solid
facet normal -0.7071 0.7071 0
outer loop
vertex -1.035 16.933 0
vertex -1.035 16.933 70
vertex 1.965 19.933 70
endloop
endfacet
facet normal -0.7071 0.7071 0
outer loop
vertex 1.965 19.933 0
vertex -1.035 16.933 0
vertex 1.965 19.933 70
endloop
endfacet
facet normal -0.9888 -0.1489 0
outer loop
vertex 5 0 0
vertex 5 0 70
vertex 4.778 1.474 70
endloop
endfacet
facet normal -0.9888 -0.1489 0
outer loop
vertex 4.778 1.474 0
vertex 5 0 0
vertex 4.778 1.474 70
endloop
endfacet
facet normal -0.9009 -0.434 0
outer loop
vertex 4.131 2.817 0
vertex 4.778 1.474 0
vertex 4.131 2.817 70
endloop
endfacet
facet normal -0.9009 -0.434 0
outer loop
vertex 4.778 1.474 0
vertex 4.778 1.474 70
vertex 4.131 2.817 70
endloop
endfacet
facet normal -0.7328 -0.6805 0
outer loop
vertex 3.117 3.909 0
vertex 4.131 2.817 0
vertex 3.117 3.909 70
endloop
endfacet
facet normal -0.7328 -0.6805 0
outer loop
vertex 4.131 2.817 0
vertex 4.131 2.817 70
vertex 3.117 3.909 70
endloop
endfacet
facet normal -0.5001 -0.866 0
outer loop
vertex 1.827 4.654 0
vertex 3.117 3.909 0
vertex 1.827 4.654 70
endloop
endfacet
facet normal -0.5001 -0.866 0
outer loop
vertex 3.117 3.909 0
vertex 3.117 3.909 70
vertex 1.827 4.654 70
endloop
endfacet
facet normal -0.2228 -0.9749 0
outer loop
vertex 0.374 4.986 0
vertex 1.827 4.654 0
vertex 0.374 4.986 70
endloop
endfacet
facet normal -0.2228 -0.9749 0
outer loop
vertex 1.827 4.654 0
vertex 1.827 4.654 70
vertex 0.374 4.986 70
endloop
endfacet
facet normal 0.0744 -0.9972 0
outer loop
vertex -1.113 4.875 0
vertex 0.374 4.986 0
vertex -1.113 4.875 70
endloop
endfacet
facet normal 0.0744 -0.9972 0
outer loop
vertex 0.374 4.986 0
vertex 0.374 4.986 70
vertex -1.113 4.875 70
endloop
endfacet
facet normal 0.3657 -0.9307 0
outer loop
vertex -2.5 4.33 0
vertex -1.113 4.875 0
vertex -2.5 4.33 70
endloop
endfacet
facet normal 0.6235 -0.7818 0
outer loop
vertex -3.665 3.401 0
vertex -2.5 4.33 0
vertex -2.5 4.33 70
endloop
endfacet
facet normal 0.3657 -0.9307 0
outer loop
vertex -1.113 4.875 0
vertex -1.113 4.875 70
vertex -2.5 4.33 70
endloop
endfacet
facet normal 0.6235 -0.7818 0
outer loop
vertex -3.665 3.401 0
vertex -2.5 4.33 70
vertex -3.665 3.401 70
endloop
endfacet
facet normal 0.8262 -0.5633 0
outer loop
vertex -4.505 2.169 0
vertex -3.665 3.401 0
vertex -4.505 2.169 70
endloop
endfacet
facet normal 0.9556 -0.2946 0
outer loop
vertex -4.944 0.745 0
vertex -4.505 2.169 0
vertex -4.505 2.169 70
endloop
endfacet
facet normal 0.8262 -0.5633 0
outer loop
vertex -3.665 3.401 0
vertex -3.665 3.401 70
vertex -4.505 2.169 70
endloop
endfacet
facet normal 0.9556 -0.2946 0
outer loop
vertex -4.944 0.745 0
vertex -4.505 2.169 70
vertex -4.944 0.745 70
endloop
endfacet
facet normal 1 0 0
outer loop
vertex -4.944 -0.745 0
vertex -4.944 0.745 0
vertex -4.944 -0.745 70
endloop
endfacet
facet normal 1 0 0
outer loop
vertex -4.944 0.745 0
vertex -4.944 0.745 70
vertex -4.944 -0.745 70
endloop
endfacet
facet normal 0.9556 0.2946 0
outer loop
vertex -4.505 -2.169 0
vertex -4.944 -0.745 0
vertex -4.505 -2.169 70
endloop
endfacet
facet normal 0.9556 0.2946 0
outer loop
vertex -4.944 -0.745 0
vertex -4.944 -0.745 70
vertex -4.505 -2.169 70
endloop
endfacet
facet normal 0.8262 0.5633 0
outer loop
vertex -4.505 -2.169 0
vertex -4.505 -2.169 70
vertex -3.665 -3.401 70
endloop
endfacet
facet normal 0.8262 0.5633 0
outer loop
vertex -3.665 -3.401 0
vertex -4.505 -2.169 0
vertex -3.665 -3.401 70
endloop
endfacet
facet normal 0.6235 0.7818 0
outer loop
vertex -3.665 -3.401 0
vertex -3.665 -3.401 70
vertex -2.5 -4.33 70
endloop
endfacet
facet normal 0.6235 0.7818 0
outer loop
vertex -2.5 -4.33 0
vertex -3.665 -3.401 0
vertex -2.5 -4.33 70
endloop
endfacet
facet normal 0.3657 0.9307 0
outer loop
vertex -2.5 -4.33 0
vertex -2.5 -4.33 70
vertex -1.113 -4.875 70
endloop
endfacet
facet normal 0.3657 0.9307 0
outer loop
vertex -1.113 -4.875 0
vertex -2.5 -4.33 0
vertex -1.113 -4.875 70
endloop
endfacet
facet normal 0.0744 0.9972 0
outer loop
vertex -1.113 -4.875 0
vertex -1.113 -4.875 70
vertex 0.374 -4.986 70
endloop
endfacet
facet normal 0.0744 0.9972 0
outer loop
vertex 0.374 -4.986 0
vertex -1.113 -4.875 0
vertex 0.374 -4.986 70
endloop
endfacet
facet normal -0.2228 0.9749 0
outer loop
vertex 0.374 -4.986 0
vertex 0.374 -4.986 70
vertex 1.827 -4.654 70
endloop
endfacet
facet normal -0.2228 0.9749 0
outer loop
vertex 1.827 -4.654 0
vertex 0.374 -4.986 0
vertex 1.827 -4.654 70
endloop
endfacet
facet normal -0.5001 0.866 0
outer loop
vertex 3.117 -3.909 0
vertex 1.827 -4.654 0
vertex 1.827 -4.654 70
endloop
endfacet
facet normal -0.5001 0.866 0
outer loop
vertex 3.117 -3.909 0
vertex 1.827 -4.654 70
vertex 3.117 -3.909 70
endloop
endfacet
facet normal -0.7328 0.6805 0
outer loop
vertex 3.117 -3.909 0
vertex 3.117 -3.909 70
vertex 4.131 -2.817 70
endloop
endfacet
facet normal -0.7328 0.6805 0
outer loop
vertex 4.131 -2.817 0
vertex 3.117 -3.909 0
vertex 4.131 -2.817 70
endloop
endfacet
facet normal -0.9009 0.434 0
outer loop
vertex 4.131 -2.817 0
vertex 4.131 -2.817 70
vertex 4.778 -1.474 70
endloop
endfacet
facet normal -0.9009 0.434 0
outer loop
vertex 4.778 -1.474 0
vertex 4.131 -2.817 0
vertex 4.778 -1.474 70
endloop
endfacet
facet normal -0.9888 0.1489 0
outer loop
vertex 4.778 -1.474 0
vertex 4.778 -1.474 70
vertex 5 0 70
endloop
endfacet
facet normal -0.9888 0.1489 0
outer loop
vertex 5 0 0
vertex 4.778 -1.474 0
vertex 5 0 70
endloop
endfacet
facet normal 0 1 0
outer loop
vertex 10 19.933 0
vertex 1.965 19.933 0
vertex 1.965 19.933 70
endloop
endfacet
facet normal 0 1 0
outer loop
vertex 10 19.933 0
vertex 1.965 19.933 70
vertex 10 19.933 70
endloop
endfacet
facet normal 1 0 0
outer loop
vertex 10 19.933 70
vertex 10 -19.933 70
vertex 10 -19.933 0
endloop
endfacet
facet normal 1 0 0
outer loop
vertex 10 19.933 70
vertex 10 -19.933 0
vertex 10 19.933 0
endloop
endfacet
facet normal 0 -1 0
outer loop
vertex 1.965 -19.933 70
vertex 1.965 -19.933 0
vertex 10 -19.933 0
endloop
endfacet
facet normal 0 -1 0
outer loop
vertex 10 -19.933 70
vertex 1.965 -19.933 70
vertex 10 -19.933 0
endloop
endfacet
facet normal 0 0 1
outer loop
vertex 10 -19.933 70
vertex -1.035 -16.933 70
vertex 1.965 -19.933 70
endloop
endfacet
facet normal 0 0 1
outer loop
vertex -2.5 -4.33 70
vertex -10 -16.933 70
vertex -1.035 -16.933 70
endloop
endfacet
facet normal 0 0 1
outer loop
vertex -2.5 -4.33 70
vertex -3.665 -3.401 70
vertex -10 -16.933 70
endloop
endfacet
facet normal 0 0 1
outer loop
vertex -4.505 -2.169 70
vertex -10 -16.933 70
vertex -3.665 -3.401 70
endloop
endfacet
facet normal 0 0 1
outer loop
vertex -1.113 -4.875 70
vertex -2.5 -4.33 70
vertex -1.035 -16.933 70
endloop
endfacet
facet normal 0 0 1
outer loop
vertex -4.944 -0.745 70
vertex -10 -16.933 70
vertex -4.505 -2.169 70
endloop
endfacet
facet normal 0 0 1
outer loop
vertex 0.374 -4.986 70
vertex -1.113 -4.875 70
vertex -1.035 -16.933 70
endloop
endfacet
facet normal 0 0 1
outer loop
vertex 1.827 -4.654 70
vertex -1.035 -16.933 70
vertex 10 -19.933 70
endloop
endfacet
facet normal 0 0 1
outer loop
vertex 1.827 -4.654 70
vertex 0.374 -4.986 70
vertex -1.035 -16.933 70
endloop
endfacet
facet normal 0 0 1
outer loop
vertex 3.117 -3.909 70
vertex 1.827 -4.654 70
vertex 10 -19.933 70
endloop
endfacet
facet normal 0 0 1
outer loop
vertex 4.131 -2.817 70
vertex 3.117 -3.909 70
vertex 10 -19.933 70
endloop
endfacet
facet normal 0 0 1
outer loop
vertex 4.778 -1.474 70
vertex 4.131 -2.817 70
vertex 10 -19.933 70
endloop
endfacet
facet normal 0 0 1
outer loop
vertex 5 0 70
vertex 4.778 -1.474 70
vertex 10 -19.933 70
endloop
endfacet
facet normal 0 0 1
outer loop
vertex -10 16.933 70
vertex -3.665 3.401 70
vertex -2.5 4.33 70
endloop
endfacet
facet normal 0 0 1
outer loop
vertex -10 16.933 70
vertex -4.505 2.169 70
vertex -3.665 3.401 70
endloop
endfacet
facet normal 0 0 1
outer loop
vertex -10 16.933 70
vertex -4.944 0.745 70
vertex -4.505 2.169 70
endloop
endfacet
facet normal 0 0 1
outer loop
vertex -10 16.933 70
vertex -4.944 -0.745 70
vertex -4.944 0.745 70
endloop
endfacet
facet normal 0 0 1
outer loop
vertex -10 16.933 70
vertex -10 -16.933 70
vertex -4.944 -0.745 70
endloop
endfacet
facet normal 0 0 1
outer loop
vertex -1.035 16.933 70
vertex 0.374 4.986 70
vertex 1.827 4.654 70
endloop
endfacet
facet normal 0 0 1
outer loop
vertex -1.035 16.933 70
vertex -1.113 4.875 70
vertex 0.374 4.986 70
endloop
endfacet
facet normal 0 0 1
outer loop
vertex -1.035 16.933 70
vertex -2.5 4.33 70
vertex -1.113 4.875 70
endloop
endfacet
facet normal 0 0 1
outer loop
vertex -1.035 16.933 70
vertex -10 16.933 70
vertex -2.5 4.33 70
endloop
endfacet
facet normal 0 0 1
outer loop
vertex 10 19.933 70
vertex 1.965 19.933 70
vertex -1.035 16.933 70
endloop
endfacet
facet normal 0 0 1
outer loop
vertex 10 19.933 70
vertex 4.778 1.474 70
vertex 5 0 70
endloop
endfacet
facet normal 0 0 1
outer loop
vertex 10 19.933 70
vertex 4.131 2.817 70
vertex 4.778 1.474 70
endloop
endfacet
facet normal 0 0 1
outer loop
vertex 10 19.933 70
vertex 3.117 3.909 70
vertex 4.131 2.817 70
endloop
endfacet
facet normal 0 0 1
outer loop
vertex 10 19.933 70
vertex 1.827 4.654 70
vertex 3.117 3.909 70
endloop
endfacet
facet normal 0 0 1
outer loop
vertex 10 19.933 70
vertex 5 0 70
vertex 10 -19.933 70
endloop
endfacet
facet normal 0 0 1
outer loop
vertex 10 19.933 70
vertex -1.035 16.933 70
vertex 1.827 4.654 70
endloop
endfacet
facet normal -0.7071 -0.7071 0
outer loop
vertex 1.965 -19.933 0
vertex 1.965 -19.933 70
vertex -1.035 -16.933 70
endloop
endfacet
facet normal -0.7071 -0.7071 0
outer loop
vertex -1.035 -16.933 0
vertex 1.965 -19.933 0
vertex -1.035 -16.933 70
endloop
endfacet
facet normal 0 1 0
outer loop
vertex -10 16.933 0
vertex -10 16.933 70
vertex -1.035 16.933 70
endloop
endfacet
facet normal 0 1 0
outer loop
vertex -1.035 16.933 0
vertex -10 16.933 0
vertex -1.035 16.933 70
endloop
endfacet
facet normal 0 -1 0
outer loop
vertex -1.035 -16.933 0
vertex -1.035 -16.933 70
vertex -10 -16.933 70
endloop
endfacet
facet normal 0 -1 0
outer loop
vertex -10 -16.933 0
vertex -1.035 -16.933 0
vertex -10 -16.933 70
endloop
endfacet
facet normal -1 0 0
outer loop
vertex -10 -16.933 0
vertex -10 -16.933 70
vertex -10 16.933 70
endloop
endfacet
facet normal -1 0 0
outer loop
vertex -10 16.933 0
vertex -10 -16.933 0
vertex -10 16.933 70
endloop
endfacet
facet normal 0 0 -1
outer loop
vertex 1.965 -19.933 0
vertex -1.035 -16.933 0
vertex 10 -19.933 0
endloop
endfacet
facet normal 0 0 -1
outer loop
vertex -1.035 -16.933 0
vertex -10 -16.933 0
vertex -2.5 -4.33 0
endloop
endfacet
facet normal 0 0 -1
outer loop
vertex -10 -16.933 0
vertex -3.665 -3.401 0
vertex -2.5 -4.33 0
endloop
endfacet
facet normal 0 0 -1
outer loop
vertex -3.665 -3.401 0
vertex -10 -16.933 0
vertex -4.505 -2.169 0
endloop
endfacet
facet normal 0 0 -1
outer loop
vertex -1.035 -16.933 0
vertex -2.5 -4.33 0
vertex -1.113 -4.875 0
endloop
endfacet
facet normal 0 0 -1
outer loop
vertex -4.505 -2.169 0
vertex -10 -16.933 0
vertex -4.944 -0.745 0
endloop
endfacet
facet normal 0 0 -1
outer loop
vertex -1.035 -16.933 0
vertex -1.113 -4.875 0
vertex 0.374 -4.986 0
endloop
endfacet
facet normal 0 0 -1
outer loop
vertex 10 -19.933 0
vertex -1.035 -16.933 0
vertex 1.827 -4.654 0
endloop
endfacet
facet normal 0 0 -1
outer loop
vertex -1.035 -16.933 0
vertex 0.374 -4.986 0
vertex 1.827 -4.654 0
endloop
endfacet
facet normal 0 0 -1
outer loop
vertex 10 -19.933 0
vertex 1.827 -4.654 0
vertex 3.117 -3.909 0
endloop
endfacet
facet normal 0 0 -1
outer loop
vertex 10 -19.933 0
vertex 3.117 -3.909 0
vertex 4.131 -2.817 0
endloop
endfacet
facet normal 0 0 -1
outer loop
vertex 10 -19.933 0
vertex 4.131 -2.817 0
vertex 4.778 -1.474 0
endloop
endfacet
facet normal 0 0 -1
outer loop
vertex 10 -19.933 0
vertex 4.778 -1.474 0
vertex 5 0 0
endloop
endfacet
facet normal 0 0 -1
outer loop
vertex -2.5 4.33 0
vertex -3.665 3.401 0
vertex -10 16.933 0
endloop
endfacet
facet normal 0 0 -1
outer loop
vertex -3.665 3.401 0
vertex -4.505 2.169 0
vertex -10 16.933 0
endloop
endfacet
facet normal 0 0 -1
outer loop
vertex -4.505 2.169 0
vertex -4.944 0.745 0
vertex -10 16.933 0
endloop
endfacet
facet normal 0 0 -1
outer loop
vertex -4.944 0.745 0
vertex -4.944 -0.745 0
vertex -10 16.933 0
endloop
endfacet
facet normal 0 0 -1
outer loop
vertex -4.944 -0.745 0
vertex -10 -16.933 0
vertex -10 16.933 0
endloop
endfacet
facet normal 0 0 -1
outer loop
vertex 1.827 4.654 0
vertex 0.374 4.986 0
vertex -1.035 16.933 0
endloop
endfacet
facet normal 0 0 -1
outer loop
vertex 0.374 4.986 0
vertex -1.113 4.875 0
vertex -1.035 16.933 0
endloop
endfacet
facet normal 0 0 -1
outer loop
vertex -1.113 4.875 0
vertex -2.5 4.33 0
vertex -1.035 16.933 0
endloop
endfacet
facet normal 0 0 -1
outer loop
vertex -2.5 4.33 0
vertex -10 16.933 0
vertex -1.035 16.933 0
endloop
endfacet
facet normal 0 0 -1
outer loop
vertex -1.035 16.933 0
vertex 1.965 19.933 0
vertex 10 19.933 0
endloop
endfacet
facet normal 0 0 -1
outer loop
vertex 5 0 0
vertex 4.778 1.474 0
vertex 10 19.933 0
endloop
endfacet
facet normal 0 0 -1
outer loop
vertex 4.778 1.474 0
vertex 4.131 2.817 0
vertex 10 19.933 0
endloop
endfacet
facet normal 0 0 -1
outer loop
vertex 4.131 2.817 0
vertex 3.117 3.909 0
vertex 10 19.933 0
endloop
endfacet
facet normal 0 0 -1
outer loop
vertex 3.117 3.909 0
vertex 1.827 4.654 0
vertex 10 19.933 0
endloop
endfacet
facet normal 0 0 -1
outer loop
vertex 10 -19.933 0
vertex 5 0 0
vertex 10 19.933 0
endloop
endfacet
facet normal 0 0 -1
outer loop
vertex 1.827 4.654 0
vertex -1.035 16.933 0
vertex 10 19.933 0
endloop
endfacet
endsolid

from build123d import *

# Parameters (mm, degrees)
SKETCH_1_W          = 20
SKETCH_1_H          = 39.865713352
EXTRUDE_1_DEPTH     = 70
CUT_EXTRUDE_1_DEPTH = 70
SKETCH_3_R          = 5
CUT_EXTRUDE_2_DEPTH = 74.466446595


with BuildPart() as part:
    # 草图1 → 凸台-拉伸1 (new body)
    with BuildSketch(Plane.XY):
        Rectangle(SKETCH_1_W, SKETCH_1_H)
    extrude(amount=EXTRUDE_1_DEPTH)

    # 草图2 → 切除-拉伸1 (cut)
    with BuildSketch(Plane.XY.offset(70)):
        Polygon((-10, -19.932856676), (1.964722344, -19.932856676), (-1.035277656, -16.932856676), (-10, -16.932856676), align=None)
        Polygon((-10, 19.932856676), (-10, 16.932856676), (-1.035277656, 16.932856676), (1.964722344, 19.932856676), align=None)
    extrude(amount=-CUT_EXTRUDE_1_DEPTH, mode=Mode.SUBTRACT)

    # 草图3 → 切除-拉伸2 (cut, through all)
    with BuildSketch(Plane.XY.offset(70)):
        Circle(SKETCH_3_R)
    extrude(amount=-CUT_EXTRUDE_2_DEPTH, mode=Mode.SUBTRACT)


solid = part.part
